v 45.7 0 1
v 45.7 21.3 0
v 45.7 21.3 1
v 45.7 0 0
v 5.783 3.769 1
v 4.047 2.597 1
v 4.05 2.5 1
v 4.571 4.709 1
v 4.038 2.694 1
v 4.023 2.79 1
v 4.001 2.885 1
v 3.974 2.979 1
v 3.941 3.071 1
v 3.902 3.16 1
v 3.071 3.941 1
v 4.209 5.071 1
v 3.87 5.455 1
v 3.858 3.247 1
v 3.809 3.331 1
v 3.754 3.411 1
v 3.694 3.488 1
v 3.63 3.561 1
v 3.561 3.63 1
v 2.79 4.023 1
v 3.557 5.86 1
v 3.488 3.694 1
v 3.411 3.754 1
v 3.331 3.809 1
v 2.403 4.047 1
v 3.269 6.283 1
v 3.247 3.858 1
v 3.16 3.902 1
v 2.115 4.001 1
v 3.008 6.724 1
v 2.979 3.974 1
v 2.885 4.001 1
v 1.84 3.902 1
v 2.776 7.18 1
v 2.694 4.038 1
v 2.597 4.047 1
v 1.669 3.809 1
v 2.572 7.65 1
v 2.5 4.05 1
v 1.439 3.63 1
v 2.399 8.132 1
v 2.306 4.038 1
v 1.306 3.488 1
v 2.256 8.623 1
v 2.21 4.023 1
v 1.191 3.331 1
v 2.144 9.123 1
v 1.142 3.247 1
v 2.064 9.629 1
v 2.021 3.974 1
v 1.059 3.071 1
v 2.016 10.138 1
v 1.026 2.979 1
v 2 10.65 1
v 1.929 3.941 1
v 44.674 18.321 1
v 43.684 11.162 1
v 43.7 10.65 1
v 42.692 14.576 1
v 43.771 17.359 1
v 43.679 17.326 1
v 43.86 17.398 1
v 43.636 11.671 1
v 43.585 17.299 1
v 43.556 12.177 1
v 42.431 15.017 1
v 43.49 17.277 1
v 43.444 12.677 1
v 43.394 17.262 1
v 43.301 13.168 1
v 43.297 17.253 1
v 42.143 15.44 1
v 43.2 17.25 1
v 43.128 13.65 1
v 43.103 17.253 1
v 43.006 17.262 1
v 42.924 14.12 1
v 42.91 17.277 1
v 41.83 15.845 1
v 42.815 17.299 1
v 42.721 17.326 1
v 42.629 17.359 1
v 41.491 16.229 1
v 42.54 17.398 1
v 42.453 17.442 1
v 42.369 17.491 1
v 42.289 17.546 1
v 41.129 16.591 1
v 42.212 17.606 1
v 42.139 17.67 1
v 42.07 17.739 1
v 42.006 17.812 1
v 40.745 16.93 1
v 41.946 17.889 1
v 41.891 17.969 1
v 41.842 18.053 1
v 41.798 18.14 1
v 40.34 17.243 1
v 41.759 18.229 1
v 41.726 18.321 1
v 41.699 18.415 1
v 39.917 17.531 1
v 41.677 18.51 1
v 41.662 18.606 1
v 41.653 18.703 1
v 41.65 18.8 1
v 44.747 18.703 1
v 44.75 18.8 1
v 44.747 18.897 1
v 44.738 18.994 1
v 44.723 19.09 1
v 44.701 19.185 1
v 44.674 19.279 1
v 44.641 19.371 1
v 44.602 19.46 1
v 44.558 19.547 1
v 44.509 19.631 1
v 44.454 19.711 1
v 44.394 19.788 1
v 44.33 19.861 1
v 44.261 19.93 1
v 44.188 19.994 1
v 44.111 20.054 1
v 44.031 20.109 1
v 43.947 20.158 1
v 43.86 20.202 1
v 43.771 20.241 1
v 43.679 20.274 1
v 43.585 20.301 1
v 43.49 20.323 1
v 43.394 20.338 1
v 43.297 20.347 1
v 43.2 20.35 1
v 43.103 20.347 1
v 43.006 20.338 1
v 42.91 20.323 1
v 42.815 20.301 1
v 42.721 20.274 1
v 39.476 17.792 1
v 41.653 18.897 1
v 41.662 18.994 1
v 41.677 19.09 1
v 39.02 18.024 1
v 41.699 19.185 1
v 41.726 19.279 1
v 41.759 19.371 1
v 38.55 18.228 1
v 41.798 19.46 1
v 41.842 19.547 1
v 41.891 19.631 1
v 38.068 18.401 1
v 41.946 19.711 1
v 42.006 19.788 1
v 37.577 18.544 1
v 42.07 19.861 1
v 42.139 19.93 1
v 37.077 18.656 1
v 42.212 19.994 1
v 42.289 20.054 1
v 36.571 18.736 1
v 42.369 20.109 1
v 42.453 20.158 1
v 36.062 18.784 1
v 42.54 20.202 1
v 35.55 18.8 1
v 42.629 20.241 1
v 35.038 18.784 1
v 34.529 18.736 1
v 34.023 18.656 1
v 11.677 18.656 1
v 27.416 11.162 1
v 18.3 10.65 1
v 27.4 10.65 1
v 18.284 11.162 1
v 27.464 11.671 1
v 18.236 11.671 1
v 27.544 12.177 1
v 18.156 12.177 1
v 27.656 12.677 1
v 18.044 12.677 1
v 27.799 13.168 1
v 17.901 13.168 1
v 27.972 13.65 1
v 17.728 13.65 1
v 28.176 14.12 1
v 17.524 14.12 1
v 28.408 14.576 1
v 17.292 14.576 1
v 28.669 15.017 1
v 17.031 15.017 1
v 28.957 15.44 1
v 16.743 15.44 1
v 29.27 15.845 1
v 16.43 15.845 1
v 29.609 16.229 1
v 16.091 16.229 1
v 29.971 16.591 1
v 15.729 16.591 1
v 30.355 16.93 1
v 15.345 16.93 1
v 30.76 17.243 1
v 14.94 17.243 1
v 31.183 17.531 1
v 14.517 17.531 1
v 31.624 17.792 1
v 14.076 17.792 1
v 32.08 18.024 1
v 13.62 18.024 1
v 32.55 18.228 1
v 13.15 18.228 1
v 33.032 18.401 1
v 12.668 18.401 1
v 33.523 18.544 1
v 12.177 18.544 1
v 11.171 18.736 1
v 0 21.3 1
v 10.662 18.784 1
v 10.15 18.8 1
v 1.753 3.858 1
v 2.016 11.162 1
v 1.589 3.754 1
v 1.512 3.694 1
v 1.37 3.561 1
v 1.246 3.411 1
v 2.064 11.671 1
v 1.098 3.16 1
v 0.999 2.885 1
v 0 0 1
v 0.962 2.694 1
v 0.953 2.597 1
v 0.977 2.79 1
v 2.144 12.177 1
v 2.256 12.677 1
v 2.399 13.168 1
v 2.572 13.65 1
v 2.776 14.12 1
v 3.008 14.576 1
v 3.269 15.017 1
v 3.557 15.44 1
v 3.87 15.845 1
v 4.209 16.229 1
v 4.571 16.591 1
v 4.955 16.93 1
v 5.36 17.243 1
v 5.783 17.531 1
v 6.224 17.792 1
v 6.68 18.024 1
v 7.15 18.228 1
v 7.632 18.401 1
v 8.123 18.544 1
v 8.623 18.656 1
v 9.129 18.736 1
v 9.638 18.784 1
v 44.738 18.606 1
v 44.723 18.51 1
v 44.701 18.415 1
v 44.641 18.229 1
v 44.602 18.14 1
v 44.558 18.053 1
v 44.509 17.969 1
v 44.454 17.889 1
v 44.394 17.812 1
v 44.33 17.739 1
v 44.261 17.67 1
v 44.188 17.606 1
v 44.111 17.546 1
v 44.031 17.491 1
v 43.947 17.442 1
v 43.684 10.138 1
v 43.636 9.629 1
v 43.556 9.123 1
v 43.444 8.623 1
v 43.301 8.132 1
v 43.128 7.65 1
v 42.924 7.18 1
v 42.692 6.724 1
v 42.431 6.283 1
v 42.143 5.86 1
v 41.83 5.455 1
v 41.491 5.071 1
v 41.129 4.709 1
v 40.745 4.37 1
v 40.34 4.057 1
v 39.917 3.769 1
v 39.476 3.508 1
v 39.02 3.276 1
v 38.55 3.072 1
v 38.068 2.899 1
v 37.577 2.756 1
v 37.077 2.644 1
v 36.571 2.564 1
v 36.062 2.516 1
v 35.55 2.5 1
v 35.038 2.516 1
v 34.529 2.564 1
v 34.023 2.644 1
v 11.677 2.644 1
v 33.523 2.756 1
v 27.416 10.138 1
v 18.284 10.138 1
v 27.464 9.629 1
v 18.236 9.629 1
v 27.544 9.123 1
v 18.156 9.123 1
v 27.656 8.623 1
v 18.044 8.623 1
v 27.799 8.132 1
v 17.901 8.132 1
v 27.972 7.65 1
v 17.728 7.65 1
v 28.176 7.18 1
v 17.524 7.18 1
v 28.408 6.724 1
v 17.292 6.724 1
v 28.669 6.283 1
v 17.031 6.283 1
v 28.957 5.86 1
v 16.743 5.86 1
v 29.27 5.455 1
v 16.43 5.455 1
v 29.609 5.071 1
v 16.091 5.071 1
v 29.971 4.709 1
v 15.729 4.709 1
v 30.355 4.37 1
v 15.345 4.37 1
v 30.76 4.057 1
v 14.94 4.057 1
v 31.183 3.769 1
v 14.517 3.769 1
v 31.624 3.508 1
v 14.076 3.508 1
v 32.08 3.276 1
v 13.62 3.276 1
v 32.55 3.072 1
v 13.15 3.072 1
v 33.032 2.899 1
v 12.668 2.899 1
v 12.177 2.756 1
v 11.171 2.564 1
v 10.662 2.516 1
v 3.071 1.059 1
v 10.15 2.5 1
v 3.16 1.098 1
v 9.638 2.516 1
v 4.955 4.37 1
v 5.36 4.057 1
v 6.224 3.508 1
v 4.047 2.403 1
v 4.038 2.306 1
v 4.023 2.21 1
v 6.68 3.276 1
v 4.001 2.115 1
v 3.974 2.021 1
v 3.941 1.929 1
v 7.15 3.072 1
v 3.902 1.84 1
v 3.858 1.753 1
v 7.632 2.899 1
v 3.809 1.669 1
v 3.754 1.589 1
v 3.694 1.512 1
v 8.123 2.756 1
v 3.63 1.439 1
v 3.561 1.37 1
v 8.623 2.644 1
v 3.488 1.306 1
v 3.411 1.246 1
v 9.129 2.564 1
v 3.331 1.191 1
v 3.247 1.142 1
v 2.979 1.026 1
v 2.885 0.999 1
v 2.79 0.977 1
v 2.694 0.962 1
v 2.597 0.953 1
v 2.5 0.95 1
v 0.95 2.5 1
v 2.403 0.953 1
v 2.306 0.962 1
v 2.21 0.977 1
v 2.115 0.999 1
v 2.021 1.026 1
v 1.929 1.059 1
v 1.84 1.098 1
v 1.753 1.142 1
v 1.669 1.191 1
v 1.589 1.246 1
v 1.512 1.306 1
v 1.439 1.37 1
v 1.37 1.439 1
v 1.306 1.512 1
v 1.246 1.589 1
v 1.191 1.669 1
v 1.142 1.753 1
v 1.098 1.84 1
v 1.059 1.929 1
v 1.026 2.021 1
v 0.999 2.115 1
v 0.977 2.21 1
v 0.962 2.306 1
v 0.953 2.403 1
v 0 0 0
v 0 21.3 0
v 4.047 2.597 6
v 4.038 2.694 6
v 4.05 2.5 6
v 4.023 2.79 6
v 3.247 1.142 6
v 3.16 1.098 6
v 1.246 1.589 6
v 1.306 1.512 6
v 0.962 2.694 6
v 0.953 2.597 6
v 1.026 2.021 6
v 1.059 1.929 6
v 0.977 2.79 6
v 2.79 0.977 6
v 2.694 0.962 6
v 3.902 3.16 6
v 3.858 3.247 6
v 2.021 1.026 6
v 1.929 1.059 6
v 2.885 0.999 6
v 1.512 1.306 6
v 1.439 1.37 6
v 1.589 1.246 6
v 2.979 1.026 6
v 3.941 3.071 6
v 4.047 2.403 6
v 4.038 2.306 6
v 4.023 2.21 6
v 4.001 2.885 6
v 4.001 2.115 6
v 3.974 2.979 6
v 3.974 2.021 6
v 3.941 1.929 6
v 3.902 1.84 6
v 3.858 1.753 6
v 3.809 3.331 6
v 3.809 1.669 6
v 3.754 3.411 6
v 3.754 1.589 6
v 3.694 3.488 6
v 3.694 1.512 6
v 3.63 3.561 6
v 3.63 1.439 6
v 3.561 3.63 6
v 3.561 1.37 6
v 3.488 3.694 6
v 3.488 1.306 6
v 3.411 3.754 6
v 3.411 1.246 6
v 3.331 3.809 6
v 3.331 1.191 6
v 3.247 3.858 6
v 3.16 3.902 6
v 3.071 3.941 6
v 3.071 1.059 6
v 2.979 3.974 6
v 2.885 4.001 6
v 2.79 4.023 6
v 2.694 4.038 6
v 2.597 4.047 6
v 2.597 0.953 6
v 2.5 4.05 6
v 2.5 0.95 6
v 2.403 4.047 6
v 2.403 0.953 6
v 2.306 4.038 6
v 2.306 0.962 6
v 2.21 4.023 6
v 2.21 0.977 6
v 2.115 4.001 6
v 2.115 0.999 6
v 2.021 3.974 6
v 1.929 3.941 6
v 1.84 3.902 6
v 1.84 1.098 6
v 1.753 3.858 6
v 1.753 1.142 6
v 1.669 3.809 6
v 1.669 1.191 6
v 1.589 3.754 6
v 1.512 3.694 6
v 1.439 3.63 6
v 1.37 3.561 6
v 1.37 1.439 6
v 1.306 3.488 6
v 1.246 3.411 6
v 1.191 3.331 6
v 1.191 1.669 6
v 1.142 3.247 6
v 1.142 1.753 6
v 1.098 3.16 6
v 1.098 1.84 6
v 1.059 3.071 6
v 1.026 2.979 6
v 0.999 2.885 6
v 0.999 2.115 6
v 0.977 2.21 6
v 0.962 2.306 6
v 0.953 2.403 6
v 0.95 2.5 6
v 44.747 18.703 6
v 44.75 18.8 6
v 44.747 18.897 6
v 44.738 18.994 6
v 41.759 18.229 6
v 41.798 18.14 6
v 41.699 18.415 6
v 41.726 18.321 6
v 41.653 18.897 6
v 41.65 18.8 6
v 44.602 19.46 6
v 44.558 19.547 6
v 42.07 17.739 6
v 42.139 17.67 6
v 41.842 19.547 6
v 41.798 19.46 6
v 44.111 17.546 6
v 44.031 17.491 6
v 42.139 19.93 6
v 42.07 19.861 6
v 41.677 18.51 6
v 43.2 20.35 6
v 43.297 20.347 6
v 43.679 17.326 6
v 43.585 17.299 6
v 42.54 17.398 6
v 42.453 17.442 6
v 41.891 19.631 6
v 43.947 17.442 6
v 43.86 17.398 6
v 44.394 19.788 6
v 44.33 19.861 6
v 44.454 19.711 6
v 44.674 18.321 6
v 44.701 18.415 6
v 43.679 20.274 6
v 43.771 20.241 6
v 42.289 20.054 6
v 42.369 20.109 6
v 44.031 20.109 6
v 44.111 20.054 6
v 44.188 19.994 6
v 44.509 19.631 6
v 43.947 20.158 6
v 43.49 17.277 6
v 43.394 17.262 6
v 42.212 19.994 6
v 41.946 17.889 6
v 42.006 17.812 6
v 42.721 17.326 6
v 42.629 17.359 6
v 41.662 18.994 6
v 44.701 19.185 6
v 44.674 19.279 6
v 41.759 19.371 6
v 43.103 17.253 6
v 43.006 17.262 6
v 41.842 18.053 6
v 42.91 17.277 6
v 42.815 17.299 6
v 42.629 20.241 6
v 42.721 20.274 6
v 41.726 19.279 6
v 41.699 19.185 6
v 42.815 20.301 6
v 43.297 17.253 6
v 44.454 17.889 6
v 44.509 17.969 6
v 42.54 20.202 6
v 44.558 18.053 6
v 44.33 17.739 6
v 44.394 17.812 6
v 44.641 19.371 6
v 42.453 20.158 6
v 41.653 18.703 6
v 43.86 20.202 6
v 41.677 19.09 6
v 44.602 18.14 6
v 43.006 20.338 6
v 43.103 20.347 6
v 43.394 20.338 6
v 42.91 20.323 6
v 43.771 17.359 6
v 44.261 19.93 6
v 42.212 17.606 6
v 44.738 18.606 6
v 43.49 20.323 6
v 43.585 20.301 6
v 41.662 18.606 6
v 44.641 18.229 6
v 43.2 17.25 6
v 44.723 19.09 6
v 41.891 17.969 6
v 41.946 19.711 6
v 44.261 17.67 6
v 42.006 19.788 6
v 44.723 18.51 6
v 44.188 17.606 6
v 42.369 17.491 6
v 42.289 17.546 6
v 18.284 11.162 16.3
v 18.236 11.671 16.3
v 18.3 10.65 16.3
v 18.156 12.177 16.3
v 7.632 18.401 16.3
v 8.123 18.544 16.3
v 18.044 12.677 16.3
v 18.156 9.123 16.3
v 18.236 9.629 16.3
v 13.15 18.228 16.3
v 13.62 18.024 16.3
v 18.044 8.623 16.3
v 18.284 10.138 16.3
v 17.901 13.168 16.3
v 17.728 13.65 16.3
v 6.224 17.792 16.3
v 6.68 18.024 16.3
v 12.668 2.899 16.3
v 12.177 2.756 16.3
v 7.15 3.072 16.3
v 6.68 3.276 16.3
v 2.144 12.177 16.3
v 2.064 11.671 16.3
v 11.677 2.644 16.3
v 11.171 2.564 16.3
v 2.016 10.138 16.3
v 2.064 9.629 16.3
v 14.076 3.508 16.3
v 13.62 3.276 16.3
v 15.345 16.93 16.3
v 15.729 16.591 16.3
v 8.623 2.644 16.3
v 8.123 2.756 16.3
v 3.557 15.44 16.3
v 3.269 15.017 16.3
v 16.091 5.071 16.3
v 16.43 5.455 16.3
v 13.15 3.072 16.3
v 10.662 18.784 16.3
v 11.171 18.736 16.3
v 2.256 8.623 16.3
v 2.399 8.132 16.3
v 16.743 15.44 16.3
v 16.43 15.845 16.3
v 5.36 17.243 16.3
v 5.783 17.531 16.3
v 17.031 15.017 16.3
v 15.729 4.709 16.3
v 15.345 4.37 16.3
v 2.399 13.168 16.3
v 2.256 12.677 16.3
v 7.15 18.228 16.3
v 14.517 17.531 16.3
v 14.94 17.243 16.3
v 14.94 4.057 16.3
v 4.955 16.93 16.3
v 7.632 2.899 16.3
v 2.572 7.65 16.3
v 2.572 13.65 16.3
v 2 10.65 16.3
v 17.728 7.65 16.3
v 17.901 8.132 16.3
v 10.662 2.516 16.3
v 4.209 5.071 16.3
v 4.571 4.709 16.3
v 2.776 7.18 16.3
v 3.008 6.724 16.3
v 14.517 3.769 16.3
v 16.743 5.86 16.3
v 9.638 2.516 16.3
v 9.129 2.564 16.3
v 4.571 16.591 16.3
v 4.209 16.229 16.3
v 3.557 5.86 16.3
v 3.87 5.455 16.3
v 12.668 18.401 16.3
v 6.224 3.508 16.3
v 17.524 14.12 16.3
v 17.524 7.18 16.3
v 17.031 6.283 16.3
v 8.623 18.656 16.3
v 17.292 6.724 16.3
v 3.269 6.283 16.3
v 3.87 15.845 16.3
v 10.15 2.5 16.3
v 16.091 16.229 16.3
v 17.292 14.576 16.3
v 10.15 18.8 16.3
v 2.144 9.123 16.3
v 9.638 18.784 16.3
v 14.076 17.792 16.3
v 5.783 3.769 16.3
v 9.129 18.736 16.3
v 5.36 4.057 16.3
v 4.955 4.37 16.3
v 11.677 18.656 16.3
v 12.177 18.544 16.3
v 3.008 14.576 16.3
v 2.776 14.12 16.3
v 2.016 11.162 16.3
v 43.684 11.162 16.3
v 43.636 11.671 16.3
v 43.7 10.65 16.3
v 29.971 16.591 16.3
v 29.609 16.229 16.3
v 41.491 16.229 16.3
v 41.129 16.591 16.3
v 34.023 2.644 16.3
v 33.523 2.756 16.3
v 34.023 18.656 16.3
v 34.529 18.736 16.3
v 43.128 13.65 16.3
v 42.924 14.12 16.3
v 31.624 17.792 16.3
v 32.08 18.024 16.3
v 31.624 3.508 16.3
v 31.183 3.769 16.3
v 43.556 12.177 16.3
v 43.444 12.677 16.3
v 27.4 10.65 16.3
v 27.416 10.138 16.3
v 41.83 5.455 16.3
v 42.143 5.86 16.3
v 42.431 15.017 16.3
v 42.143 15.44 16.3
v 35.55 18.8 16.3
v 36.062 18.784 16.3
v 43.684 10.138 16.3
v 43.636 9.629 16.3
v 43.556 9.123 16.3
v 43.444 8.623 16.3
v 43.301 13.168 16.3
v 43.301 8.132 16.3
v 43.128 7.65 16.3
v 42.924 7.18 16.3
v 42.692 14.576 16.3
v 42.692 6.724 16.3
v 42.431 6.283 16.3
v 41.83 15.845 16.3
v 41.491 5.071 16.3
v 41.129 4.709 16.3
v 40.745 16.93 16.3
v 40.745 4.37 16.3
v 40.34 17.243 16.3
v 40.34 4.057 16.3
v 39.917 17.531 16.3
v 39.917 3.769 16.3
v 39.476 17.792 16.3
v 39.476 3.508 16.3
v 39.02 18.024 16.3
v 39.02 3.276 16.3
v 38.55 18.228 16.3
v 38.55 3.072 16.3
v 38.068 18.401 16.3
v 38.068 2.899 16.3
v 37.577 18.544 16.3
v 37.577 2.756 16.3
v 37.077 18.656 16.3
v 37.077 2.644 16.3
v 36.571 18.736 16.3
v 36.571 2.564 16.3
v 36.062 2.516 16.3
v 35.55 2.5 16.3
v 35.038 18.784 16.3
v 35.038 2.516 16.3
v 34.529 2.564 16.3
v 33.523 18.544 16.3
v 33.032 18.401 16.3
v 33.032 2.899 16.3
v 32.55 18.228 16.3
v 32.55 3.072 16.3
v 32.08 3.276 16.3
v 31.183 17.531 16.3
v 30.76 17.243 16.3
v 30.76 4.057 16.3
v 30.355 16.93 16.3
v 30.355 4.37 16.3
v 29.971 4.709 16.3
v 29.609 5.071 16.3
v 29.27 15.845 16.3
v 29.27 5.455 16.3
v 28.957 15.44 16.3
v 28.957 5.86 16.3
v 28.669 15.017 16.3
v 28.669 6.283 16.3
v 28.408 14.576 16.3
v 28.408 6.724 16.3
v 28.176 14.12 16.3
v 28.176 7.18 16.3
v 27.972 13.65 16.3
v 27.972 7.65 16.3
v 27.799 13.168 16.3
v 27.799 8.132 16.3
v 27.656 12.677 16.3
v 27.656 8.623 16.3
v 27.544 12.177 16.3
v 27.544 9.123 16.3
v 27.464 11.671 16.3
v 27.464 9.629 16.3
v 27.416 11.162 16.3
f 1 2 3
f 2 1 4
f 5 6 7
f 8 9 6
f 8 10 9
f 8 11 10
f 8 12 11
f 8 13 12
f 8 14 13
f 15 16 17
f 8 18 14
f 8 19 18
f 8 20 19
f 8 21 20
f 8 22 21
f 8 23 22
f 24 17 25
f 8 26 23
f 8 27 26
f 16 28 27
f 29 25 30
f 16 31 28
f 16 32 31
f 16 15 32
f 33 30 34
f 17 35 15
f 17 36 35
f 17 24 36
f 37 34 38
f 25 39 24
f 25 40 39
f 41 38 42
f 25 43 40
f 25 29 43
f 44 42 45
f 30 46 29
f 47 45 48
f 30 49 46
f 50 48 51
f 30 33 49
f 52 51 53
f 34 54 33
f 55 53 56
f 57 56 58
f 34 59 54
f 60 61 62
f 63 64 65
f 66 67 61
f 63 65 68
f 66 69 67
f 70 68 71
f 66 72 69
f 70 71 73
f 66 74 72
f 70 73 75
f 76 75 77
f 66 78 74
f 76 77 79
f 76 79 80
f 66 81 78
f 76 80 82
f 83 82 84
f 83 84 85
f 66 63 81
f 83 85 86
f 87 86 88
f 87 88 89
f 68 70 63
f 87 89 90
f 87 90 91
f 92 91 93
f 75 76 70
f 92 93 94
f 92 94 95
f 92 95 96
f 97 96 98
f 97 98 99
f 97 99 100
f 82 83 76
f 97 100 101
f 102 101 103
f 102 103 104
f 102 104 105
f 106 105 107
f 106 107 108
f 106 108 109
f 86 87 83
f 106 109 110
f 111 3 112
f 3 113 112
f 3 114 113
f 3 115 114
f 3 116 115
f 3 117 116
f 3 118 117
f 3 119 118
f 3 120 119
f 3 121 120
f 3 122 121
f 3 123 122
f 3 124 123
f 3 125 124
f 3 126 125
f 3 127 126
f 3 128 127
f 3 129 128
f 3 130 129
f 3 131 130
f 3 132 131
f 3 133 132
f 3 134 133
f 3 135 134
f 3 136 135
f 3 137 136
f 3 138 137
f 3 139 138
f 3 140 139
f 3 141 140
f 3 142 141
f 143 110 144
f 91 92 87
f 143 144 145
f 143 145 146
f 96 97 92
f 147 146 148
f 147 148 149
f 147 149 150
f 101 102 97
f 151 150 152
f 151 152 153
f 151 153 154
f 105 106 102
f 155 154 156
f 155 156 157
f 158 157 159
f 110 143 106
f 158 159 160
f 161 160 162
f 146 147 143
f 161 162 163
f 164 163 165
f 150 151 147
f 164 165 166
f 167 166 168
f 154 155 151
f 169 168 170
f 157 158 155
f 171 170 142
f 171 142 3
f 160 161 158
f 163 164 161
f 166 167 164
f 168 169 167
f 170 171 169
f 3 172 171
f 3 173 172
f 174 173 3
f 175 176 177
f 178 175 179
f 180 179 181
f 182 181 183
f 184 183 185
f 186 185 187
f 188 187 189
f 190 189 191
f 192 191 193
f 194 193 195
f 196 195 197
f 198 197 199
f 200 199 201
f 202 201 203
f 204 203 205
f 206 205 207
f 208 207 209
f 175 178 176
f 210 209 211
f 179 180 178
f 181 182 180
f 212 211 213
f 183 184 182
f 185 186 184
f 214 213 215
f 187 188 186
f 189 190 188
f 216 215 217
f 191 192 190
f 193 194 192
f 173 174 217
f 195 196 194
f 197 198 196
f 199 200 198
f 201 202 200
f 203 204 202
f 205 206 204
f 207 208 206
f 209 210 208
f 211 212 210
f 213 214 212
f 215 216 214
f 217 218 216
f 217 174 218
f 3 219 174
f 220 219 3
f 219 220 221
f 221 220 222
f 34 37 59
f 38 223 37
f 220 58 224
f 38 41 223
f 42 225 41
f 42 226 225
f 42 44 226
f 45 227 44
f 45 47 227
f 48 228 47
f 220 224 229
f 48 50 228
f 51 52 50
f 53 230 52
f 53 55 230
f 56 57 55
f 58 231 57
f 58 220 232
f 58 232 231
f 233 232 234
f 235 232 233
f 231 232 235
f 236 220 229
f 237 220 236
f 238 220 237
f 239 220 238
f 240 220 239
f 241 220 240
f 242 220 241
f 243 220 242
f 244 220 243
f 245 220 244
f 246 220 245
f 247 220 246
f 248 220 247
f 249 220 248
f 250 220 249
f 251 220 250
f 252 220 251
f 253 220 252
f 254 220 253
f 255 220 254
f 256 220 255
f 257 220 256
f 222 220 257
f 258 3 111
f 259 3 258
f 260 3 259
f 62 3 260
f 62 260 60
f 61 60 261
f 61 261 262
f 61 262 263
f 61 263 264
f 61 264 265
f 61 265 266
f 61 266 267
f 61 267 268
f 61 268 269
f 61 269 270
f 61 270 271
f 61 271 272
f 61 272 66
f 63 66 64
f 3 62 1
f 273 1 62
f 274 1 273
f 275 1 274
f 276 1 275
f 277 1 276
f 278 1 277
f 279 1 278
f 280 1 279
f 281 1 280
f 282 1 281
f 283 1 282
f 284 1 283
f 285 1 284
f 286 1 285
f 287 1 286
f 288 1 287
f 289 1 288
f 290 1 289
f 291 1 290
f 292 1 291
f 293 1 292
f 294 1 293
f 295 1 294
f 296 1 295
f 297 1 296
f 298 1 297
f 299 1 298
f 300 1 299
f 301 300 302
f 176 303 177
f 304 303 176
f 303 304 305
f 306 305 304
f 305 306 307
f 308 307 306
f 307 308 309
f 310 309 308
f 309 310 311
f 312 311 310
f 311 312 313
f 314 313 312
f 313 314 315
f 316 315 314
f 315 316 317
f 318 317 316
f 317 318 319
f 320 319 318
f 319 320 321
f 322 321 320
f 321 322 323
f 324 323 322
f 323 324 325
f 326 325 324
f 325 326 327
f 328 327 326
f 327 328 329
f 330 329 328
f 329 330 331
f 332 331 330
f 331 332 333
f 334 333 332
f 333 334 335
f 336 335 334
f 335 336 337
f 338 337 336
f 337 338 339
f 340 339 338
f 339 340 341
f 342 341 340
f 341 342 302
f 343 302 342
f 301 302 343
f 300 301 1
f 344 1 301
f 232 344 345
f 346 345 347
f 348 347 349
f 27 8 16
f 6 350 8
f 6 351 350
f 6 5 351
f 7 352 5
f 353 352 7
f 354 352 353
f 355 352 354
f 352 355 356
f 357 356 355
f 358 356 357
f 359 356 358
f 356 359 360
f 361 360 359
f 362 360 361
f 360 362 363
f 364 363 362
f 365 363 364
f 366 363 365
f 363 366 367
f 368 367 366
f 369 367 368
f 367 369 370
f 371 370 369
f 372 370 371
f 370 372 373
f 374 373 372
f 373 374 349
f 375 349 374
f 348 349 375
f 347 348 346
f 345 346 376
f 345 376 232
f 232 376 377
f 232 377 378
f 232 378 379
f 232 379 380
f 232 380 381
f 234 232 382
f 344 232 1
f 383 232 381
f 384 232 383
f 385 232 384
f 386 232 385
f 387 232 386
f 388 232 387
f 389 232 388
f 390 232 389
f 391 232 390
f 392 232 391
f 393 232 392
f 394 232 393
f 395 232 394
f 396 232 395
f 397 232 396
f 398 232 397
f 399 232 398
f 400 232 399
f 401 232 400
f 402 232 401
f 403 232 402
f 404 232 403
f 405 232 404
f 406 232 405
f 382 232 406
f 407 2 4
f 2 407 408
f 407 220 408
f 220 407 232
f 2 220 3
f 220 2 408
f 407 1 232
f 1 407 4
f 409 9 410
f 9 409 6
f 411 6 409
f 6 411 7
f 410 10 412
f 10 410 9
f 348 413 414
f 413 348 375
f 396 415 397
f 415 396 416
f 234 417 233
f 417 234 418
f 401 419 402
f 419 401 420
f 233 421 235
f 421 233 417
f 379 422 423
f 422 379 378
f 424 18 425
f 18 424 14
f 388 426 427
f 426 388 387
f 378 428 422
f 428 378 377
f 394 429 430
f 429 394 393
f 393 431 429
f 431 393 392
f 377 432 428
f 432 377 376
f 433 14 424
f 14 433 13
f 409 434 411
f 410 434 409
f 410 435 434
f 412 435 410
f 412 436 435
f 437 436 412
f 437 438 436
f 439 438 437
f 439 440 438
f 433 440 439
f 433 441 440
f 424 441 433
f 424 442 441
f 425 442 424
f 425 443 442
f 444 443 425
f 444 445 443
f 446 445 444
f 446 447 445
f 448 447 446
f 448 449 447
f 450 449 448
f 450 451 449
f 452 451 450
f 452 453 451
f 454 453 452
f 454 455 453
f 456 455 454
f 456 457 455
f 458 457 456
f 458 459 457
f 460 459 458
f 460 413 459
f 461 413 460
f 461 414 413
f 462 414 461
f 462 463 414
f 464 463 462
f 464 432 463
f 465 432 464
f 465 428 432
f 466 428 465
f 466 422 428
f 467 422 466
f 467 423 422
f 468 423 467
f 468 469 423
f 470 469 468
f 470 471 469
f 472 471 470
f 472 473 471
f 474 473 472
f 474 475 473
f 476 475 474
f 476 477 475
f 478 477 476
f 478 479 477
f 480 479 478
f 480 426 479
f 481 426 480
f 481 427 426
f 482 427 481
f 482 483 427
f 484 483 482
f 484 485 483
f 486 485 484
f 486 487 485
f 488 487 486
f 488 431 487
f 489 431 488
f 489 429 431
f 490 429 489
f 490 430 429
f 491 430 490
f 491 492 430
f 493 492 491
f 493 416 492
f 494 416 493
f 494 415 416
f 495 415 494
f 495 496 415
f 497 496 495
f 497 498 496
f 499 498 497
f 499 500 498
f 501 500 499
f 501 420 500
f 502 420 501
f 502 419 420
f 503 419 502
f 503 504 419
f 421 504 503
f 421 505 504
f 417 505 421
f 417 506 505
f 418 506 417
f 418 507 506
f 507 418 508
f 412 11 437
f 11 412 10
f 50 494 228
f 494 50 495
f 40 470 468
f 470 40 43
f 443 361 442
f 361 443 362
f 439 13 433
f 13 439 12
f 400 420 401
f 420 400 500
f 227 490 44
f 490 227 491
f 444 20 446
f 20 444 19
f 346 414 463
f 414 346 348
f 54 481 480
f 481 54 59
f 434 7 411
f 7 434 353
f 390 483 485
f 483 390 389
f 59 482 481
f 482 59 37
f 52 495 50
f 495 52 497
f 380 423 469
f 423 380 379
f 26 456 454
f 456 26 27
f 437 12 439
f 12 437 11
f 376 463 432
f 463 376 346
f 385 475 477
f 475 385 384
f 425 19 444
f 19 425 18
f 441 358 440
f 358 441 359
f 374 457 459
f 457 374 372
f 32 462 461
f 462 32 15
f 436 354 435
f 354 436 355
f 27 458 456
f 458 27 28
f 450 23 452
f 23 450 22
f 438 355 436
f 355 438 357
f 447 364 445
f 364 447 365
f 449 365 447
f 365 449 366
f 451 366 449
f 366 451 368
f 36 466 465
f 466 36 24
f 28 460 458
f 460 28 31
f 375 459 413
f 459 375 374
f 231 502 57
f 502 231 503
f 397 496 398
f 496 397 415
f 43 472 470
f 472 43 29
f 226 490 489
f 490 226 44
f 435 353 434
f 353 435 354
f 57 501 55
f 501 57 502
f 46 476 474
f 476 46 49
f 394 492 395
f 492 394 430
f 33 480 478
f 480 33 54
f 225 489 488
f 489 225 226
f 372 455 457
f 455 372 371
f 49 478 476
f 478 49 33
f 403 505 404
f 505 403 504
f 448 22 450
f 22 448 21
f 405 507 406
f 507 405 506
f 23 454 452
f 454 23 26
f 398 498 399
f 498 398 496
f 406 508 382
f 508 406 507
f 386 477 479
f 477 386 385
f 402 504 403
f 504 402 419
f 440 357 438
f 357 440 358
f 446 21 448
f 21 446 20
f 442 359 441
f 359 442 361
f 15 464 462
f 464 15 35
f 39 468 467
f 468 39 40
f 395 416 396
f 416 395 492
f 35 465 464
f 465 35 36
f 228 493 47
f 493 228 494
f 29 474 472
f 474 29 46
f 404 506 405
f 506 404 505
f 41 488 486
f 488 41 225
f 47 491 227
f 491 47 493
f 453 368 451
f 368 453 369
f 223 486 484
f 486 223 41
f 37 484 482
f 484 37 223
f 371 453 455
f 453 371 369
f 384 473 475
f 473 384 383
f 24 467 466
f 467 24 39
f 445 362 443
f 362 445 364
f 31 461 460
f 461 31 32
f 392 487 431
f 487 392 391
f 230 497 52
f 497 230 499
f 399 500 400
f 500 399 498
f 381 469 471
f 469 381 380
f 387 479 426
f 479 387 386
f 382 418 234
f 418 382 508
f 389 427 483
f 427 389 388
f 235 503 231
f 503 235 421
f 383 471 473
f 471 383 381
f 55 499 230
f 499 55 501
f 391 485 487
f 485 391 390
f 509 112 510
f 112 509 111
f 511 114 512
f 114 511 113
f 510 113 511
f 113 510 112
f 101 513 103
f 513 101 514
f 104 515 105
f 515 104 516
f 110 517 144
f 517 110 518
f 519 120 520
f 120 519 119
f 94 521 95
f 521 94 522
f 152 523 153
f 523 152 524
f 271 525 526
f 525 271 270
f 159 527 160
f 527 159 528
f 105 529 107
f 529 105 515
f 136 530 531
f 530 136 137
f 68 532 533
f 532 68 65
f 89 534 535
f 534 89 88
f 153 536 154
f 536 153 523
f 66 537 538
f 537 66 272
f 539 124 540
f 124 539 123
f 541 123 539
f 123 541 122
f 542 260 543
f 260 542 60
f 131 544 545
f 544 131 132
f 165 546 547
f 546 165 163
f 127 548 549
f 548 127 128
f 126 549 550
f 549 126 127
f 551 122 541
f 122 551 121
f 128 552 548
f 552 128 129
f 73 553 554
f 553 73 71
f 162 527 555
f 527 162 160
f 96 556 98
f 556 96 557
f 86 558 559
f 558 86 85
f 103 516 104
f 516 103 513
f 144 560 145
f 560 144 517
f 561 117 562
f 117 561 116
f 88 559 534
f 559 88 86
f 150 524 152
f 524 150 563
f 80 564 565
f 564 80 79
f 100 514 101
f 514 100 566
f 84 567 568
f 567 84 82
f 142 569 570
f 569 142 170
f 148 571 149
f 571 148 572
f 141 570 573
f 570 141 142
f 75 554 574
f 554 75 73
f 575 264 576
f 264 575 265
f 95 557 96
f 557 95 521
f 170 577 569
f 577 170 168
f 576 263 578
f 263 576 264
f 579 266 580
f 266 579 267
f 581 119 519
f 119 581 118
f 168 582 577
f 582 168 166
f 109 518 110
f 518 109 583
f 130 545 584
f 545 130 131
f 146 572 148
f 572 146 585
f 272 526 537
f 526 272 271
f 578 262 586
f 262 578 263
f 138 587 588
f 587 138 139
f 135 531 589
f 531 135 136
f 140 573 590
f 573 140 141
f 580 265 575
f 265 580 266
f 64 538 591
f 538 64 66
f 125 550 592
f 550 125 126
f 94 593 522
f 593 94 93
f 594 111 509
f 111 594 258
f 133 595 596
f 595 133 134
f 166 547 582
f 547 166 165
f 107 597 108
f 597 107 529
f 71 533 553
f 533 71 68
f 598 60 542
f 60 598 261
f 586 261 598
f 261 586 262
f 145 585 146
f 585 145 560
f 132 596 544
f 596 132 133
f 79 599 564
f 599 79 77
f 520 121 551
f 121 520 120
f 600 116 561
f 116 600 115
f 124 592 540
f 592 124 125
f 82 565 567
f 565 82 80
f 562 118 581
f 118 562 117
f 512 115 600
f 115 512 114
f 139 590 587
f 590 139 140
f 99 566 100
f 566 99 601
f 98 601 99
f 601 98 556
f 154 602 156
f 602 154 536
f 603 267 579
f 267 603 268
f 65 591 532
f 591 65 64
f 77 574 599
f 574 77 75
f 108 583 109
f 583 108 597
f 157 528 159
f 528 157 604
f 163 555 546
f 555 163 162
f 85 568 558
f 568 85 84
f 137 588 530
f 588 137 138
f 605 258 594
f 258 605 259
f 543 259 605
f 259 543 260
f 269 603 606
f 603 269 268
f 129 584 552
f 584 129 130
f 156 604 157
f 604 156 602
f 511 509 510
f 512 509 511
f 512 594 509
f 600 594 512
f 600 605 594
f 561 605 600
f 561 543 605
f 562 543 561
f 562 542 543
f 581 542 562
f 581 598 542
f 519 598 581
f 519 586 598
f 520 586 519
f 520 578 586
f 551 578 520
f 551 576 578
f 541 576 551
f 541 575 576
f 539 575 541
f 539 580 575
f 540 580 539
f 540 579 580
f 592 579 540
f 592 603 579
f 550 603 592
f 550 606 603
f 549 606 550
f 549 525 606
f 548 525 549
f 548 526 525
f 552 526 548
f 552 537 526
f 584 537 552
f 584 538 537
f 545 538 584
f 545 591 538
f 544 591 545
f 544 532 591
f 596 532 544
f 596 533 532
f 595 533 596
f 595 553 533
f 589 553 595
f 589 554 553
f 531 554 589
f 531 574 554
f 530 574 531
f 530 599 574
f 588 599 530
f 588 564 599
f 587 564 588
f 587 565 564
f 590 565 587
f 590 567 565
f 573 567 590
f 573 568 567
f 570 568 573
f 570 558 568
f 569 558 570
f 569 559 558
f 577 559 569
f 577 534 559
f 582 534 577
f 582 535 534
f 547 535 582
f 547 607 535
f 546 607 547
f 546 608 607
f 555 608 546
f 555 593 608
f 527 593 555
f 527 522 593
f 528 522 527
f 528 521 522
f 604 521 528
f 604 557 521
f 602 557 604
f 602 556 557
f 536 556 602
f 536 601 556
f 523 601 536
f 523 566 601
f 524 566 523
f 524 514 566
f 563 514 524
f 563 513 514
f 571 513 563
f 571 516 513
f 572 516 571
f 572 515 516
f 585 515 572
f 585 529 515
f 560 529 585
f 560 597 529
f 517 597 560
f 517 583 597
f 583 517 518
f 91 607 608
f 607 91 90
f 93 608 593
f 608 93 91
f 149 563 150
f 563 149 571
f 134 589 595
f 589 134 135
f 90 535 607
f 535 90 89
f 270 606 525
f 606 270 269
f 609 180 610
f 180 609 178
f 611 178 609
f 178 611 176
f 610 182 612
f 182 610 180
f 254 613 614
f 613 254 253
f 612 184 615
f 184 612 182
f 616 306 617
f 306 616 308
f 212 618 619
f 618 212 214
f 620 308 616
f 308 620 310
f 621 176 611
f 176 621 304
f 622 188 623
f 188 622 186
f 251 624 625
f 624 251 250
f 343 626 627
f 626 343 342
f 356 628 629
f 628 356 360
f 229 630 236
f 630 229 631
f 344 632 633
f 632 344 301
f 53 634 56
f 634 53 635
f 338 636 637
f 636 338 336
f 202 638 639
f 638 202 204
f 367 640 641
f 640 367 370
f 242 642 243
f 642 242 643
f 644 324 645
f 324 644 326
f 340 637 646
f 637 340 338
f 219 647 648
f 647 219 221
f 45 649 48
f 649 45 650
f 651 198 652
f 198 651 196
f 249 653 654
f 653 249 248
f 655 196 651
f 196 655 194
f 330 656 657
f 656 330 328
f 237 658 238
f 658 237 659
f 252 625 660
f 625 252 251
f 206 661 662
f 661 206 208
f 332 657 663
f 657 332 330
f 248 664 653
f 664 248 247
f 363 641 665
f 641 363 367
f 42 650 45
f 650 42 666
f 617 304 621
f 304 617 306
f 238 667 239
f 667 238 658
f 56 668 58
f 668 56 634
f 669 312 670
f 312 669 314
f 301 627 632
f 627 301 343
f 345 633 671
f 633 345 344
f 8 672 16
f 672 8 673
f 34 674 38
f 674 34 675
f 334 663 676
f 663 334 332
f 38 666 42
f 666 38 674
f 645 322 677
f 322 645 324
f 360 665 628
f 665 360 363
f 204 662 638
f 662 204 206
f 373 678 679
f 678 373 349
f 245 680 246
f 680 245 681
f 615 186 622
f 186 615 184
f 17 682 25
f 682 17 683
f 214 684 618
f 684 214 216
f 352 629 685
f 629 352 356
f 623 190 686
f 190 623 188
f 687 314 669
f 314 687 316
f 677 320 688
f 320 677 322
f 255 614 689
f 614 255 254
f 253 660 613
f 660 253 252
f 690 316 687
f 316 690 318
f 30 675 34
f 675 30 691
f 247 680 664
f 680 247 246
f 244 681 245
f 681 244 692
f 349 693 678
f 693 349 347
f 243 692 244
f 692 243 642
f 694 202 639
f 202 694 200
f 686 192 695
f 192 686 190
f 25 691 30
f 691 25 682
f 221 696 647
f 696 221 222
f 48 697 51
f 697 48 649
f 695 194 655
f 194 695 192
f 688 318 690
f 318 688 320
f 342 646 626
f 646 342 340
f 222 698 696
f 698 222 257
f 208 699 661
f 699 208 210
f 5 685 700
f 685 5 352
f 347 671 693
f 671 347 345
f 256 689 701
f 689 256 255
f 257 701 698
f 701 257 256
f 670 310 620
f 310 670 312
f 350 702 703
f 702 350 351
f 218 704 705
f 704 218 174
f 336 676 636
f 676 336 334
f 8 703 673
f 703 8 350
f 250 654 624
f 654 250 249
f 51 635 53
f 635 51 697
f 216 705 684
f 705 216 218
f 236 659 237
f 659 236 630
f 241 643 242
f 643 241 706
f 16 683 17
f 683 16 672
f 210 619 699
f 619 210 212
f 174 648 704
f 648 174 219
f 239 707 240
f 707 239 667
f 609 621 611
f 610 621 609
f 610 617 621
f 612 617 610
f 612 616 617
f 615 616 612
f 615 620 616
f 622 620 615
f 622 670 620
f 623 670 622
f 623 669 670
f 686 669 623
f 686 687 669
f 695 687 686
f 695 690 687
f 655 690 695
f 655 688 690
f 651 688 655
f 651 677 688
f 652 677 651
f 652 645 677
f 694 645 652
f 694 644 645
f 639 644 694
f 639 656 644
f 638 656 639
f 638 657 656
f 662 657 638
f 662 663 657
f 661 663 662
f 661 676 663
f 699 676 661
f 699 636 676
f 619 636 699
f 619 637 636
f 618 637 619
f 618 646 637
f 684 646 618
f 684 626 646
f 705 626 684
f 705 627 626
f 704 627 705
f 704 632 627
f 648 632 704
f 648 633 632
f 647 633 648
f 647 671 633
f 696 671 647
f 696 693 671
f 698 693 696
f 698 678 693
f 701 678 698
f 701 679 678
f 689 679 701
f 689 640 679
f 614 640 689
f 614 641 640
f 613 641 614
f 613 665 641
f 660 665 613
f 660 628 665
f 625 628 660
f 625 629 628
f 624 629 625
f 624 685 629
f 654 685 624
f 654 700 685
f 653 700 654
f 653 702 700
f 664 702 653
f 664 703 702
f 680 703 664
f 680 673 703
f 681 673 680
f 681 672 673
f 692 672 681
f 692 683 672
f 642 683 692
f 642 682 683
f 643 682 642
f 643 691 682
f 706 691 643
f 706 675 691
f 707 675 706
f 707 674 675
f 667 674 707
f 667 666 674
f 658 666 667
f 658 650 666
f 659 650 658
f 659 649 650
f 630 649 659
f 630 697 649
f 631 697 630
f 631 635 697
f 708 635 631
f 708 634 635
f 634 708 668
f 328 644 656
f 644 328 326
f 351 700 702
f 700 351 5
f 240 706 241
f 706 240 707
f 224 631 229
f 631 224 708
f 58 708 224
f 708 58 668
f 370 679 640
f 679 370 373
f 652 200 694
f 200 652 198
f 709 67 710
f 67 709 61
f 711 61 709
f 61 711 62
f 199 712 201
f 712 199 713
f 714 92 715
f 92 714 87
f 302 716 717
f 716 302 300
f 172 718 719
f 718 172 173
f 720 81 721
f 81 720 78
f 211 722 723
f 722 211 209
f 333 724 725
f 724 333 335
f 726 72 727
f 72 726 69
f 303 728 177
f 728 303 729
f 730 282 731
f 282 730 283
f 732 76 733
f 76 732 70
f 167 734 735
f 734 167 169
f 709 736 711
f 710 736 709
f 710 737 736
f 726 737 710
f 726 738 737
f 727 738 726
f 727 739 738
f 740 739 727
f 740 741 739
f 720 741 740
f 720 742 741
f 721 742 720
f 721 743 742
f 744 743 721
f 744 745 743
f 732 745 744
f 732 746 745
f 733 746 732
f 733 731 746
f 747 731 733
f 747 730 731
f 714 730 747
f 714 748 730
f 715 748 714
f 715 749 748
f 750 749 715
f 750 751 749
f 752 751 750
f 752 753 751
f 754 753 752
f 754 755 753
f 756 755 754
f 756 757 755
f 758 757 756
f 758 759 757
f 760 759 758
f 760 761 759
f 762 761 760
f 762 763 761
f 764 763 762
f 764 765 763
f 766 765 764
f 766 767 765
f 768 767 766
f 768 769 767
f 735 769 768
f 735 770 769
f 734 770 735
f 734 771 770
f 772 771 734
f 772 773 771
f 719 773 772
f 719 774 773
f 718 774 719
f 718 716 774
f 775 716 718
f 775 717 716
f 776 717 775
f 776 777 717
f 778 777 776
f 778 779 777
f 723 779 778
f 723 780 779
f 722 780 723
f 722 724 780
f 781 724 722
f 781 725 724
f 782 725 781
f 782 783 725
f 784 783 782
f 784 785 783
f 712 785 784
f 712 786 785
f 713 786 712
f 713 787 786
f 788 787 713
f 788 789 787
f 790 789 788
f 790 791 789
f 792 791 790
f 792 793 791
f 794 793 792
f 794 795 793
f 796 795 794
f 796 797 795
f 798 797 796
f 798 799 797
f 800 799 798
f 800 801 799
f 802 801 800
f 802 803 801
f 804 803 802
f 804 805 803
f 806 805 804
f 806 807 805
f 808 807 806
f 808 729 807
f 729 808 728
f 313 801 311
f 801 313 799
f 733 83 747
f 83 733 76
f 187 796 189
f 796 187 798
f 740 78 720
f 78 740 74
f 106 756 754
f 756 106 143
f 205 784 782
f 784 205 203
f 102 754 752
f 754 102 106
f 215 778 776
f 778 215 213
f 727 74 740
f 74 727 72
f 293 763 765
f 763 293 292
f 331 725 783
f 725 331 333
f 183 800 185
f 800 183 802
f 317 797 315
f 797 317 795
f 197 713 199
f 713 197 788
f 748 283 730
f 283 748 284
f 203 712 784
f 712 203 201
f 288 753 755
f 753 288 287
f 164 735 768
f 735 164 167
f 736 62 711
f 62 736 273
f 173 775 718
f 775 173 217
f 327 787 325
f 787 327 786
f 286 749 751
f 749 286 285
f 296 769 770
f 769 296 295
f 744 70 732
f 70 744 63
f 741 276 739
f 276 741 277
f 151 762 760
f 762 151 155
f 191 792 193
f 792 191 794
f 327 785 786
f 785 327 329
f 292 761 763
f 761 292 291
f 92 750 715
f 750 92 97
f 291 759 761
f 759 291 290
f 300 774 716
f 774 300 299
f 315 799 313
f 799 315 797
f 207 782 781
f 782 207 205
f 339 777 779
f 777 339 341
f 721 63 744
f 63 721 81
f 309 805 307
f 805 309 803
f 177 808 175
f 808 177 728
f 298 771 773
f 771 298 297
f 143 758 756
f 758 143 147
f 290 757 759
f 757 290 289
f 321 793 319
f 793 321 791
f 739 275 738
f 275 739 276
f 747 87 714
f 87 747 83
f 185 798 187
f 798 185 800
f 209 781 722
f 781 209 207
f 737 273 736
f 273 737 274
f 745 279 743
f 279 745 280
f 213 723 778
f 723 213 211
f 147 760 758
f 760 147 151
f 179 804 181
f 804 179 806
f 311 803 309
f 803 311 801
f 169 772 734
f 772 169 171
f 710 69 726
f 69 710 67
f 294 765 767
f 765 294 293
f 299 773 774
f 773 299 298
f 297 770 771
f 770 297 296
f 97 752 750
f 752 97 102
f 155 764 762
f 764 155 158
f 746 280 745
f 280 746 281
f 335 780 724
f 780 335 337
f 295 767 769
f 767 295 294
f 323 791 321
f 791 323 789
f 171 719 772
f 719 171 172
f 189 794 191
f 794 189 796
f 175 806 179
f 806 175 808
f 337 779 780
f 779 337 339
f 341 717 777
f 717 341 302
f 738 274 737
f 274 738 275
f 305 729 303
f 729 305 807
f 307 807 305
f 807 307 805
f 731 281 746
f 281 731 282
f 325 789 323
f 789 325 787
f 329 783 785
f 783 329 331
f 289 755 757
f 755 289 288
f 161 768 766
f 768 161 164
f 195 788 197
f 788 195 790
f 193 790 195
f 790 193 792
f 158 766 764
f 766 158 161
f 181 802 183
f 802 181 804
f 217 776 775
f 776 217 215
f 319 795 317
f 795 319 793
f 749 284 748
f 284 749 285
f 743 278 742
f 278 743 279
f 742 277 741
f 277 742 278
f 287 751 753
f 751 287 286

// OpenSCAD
module uno() {
    
    x = 45.7;
    y = 21.3;
    z = 1;
    
    m = 16.3;
    
    cube([x,y,z]);
    translate([2.5,2.5,1])
    cylinder(r=3.1/2, h=5, $fn=100);


    translate([x-2.5,y-2.5,1])
    cylinder(r=3.1/2, h=5, $fn=100);
    
    translate([(m/2)+2,y/2,1])
    cylinder(r=m/2, h=15.3, $fn=100);
    
    translate([ x - 2 -(m/2),y/2,1])
    cylinder(r=m/2, h=15.3, $fn=100);

    
}

uno();
